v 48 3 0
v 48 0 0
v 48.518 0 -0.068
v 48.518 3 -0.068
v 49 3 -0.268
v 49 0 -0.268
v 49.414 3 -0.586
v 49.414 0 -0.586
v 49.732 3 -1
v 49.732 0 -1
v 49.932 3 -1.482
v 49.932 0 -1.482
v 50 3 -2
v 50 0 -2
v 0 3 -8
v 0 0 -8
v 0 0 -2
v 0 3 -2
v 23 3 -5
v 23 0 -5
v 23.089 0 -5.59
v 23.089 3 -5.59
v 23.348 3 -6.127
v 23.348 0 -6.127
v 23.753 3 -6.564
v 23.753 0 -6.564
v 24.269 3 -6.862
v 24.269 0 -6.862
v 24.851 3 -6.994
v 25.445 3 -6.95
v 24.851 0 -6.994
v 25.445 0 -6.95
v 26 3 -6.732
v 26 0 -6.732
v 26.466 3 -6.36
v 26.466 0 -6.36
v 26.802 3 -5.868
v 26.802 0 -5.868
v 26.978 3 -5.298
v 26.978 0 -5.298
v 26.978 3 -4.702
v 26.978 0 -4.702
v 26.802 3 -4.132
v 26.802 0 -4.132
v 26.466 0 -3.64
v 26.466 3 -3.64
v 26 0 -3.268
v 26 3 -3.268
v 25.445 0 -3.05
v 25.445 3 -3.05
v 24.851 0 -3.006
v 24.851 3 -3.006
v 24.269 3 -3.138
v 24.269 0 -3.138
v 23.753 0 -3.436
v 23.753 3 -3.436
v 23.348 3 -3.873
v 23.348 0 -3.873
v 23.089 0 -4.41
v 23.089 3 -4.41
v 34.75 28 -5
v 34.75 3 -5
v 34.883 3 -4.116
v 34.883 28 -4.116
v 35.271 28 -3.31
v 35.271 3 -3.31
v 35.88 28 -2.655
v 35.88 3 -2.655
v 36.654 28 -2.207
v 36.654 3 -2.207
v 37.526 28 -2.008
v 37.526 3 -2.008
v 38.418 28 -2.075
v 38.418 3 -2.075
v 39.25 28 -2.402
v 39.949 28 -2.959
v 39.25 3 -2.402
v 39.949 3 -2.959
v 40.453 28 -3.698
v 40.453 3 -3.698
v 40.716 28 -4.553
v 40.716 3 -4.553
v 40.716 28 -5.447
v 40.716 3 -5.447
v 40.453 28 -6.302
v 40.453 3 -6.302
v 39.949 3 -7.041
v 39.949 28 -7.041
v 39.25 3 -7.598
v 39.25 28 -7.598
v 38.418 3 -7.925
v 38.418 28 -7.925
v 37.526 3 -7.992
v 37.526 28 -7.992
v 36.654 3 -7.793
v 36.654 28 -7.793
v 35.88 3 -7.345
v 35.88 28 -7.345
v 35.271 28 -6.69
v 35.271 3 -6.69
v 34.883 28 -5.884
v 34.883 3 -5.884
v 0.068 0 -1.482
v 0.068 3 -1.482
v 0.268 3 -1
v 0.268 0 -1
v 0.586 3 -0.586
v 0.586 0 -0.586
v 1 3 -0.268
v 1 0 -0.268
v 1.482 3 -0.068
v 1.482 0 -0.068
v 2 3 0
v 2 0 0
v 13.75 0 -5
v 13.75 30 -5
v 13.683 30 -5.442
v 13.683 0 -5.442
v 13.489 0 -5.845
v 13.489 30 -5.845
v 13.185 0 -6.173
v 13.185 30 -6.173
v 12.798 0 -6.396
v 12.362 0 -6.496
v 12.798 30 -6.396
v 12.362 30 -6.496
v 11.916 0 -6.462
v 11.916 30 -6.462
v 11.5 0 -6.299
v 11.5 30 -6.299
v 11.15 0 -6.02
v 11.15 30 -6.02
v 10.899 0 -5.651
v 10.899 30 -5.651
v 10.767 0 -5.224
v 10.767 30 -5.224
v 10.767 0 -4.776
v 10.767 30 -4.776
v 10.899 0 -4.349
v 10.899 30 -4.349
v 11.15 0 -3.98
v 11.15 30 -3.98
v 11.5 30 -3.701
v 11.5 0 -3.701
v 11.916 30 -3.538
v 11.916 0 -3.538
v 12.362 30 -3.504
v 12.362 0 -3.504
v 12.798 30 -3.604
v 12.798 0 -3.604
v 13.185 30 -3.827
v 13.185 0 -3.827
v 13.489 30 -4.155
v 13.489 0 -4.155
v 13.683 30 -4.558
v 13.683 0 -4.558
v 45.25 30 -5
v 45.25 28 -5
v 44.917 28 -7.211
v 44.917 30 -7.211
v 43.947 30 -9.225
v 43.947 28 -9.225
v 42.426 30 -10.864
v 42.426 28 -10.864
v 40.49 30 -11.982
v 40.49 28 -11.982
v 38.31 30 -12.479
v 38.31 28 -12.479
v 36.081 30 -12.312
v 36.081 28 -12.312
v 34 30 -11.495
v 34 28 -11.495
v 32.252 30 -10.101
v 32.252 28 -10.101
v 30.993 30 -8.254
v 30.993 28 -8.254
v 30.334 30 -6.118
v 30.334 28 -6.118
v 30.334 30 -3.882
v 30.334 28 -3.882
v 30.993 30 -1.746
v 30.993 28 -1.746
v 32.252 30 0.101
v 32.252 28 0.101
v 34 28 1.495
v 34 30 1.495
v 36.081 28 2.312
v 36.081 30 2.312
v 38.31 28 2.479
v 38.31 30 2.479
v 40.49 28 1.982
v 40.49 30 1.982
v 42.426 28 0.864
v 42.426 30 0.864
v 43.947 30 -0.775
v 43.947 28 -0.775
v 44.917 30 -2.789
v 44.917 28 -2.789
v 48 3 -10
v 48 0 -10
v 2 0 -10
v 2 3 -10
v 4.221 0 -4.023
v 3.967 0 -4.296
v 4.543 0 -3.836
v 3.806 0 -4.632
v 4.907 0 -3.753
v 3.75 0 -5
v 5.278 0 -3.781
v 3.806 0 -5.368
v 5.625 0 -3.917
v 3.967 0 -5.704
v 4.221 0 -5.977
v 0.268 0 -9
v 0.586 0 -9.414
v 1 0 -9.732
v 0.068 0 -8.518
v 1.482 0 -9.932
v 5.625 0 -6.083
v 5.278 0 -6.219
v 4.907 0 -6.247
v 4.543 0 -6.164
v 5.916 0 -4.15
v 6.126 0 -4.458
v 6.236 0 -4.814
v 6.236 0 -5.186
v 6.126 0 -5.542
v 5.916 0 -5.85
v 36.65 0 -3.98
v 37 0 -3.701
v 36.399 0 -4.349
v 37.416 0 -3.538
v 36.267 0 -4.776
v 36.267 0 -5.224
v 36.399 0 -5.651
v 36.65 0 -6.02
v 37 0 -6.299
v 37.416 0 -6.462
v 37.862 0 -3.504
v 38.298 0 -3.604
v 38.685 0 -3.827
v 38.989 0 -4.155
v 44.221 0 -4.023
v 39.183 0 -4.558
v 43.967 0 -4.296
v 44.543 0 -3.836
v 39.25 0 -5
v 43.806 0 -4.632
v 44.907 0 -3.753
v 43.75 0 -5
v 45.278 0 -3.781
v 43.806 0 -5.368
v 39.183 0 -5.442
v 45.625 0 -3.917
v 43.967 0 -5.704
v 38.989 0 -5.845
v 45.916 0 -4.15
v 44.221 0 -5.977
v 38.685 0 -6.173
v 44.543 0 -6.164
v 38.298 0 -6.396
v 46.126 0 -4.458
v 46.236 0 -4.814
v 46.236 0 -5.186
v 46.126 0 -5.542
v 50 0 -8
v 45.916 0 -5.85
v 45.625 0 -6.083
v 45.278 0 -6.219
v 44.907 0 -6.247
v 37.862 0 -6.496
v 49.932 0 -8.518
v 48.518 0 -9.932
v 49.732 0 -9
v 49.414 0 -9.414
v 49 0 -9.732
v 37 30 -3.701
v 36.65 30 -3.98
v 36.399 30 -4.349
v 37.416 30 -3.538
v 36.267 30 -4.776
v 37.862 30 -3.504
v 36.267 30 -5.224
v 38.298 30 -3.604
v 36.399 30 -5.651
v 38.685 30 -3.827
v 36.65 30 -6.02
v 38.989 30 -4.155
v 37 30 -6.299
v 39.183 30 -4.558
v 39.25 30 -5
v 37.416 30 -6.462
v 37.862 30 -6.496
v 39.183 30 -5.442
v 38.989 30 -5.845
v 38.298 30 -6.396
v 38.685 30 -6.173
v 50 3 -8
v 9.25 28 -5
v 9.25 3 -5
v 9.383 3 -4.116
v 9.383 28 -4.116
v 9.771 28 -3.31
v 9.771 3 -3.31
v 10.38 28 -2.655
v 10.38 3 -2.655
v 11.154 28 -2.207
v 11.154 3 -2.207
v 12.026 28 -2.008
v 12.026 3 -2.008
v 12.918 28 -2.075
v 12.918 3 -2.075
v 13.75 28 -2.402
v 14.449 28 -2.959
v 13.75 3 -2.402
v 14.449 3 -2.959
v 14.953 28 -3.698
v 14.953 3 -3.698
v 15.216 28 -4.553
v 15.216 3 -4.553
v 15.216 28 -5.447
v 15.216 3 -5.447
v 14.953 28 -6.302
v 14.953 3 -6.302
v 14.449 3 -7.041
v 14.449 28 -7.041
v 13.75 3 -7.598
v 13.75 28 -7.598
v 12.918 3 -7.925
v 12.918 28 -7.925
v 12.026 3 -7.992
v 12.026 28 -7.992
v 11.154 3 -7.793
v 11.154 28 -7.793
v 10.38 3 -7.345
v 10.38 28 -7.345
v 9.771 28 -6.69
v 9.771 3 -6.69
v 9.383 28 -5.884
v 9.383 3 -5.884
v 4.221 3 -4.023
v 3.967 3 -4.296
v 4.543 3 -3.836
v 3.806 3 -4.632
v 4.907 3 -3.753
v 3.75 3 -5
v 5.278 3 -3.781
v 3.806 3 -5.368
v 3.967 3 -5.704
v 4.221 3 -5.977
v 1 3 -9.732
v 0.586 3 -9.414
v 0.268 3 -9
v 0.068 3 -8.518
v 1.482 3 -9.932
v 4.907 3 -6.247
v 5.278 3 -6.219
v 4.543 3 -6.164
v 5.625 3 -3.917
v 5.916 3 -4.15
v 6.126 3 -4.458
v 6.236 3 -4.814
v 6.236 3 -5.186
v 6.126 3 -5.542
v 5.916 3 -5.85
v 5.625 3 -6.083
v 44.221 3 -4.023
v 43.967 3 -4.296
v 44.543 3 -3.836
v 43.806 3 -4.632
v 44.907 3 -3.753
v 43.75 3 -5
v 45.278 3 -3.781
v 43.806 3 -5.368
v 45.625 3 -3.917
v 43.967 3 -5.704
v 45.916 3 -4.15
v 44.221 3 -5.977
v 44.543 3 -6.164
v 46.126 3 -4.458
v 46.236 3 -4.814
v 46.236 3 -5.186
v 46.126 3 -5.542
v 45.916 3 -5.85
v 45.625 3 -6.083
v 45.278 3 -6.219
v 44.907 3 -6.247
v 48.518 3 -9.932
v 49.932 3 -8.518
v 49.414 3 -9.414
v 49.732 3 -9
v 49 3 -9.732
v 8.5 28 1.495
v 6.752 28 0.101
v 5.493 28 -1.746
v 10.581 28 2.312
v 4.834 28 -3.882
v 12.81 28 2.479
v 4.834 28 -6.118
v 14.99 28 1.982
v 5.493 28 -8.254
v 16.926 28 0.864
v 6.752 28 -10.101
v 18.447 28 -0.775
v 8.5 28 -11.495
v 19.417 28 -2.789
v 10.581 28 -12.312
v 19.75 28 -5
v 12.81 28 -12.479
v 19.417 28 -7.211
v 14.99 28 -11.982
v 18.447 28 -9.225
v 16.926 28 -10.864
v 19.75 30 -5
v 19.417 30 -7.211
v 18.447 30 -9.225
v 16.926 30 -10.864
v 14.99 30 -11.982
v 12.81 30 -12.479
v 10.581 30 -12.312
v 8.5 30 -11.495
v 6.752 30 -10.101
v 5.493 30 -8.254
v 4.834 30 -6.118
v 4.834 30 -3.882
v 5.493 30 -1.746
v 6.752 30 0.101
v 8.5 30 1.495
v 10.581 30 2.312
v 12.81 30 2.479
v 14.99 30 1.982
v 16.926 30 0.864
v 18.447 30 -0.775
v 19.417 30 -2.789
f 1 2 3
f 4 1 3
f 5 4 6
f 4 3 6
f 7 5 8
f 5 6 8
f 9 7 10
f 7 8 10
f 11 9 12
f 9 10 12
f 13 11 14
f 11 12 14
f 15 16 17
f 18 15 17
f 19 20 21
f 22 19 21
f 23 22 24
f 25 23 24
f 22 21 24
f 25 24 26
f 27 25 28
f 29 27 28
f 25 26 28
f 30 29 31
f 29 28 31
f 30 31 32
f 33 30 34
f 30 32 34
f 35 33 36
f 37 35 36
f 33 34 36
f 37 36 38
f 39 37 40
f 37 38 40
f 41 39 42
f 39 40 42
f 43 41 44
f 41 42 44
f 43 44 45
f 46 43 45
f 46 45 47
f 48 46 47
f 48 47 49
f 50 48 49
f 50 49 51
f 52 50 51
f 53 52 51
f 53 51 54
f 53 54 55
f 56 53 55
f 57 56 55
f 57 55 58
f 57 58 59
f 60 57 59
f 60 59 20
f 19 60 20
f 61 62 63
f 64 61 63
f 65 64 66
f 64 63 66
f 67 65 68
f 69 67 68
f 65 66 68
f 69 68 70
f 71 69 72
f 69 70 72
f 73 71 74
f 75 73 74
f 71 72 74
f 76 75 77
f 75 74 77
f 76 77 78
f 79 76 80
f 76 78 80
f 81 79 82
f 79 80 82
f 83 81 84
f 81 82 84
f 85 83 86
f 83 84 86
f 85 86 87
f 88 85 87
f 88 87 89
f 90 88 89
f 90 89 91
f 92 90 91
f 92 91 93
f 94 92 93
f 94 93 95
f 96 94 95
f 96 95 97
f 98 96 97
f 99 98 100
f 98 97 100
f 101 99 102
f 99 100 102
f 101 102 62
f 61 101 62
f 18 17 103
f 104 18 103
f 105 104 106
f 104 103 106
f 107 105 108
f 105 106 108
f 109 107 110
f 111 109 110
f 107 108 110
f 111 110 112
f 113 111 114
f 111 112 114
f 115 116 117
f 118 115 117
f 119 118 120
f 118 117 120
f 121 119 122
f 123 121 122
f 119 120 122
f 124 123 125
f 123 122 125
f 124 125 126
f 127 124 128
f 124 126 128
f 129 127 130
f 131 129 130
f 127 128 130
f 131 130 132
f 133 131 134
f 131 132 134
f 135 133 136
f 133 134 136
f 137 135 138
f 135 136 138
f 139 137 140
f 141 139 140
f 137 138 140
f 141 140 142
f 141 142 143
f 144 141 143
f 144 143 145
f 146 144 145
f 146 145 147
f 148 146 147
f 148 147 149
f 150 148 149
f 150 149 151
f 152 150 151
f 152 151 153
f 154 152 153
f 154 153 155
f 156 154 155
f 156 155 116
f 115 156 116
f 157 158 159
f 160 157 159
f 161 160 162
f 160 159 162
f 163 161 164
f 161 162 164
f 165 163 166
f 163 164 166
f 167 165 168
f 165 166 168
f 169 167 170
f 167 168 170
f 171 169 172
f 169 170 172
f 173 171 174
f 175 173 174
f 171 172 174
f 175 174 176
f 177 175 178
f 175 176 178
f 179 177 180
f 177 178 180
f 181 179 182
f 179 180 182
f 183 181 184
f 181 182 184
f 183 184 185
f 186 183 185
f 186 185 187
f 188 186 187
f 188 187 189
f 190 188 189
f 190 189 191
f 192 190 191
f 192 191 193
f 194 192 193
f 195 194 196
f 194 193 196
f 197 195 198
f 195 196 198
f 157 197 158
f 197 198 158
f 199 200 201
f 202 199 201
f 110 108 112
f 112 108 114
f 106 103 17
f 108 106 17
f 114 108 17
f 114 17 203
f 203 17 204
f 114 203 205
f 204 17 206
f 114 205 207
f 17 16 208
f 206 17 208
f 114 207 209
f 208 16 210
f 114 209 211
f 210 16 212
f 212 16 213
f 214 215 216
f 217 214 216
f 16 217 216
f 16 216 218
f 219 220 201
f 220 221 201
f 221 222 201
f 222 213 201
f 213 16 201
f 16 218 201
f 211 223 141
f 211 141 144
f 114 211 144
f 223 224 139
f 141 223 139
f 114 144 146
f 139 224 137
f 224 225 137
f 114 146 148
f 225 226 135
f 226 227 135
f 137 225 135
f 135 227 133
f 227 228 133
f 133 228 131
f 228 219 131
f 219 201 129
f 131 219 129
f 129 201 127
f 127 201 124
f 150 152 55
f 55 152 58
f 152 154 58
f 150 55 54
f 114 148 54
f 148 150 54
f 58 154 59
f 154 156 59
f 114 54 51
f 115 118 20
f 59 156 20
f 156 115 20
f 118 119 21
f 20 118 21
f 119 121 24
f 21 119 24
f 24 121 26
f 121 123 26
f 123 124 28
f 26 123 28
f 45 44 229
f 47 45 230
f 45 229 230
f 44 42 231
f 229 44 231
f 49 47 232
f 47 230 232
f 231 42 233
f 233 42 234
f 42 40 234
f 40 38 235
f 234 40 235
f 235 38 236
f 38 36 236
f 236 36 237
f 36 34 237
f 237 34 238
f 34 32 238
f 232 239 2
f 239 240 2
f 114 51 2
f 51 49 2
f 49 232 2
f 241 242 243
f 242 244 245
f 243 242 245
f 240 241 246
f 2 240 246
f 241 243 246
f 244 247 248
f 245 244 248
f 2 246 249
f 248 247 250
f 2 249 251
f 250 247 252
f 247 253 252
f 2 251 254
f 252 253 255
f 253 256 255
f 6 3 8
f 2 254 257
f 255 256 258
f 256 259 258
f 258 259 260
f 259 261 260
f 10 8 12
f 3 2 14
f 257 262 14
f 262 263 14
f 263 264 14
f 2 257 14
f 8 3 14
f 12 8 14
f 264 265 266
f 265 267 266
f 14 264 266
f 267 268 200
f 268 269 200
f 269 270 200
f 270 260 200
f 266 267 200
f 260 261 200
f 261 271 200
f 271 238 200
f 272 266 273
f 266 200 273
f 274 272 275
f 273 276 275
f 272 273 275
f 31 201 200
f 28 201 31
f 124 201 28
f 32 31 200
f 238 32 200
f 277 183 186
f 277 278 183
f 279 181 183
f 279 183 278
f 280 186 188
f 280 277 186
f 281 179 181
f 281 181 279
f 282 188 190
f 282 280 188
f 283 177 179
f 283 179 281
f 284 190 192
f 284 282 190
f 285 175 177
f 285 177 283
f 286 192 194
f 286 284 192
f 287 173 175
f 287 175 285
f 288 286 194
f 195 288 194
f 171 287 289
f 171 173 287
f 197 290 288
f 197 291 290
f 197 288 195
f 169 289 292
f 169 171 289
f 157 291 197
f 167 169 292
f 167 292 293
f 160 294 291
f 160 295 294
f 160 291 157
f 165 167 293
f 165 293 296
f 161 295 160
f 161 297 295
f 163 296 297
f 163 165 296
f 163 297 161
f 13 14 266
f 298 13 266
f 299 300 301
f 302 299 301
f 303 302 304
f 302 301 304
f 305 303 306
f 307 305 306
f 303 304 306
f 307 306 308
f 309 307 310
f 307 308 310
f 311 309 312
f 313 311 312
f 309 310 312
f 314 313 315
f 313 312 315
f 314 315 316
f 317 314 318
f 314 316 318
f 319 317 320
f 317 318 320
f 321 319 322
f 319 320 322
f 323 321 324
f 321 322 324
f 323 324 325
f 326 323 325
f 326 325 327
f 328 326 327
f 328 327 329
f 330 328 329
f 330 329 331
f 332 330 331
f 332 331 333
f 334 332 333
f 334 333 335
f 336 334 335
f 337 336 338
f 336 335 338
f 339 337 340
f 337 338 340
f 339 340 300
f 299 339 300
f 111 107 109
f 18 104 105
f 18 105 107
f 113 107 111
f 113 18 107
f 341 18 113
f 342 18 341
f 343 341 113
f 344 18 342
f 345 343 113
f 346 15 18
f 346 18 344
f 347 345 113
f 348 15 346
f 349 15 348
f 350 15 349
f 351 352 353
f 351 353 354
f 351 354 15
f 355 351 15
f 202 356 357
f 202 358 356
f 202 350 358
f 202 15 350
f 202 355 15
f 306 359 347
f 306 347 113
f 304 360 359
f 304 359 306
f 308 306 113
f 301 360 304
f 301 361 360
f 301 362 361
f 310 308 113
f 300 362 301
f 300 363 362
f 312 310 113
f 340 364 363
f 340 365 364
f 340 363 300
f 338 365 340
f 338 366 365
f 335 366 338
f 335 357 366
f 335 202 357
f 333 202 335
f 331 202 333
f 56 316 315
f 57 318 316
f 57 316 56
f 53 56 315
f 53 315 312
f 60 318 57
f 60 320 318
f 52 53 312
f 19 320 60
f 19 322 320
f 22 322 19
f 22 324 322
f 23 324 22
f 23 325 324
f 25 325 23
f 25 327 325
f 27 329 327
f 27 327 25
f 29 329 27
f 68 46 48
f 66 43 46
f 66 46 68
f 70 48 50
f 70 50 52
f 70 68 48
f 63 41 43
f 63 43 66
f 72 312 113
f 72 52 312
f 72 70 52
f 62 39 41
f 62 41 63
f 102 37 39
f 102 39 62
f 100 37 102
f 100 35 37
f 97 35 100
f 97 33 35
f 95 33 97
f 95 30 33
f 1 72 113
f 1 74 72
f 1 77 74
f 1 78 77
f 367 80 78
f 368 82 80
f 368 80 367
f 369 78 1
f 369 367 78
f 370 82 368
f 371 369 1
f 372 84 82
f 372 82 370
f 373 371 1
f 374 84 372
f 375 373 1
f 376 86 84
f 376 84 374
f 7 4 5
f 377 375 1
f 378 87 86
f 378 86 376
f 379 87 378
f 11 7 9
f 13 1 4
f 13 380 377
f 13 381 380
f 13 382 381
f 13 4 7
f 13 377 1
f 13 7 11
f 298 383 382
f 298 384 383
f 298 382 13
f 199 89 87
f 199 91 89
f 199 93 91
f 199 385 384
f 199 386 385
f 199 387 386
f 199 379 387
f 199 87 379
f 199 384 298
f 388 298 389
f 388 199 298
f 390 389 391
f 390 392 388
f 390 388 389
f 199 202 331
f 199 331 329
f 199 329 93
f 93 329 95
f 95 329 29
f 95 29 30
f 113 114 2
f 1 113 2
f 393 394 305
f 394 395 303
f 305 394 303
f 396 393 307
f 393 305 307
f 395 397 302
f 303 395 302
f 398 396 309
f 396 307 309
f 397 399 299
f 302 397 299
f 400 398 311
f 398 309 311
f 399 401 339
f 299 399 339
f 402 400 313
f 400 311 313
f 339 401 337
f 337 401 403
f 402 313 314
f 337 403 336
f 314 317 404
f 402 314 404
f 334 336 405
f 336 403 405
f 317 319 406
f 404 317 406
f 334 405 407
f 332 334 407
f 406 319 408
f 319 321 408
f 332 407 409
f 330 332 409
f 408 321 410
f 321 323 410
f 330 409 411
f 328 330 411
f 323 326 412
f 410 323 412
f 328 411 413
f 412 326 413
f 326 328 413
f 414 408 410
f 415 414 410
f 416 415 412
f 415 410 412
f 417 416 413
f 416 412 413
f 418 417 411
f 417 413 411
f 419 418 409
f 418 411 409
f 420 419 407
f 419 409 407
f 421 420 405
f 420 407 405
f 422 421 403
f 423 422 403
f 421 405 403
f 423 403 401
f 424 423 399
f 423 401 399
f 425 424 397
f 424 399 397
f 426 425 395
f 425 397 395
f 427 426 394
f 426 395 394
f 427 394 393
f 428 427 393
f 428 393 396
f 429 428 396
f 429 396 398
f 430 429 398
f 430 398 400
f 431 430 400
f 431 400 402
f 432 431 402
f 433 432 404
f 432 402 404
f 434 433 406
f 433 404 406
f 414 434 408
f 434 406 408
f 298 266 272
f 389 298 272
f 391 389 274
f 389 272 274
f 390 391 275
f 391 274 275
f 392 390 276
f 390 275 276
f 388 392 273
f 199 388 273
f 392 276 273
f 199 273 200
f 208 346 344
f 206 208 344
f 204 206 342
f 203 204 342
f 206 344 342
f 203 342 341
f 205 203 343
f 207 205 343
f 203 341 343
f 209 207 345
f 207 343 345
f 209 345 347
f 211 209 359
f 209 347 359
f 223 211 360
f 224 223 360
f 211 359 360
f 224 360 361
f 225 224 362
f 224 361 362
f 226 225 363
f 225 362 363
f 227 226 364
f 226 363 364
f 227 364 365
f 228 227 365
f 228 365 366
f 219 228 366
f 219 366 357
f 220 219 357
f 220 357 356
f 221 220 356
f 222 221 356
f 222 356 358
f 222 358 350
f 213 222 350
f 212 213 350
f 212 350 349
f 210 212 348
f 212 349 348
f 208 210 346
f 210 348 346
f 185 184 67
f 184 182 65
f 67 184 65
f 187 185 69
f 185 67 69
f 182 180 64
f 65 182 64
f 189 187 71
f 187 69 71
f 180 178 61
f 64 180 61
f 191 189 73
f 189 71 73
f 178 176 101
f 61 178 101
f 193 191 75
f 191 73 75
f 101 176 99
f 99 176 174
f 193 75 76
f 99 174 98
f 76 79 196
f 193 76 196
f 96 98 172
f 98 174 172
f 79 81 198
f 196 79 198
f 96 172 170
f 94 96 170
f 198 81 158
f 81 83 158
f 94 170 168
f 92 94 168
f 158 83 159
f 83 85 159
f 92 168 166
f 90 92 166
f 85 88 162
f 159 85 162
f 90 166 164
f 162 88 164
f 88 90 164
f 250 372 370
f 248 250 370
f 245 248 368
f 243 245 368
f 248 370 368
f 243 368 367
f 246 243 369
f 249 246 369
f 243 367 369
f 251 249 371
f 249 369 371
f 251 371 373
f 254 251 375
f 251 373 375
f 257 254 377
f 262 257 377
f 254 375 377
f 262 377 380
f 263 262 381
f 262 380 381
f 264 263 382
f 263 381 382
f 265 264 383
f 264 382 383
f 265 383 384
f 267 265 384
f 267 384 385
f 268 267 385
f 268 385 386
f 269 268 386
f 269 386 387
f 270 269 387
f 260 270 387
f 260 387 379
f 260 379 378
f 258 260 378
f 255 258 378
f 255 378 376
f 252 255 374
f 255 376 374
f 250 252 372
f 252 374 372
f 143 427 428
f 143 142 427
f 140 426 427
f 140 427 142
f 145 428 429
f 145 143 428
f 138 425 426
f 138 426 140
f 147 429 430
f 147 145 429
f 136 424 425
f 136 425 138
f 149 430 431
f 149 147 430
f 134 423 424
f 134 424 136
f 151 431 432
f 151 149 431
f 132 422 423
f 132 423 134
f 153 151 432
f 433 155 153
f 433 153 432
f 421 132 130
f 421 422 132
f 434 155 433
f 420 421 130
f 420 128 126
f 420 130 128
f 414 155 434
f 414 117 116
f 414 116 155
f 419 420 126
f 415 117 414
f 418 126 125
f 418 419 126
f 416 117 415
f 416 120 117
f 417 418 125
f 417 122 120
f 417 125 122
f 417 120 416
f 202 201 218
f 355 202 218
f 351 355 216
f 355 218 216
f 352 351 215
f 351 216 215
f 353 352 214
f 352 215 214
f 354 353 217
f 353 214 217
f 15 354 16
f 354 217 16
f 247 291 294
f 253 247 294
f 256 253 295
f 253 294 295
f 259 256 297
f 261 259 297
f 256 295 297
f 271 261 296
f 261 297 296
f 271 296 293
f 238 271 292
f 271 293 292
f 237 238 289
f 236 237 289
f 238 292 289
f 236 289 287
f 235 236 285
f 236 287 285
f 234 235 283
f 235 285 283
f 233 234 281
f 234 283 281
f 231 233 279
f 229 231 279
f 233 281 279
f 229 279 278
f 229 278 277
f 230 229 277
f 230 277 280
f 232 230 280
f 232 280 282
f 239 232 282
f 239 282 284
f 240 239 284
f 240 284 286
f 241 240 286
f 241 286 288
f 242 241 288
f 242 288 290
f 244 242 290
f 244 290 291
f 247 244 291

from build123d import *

# Parameters (mm, degrees)
BOSS_EXTRUDE8_DEPTH  = 3
CUT_EXTRUDE8_DEPTH   = 3
BOSS_EXTRUDE9_DEPTH  = 25
SKETCH17_R           = 7.5
BOSS_EXTRUDE10_DEPTH = 2
SKETCH18_R           = 1.5
CUT_EXTRUDE9_DEPTH   = 62
SKETCH19_R           = 7.5
BOSS_EXTRUDE11_DEPTH = 2
SKETCH21_R           = 1.5
CUT_EXTRUDE10_DEPTH  = 52
CUT_EXTRUDE11_DEPTH  = 22


with BuildPart() as part:
    # Sketch1 → Boss-Extrude8 (new body)
    with BuildSketch(Plane(origin=(0, 0, 0), x_dir=(1, 0, 0), z_dir=(0, 1, 0))):
        with BuildLine():
            Line((2, 0), (48, 0))
            ThreePointArc((48, 0), (49.414213562, 0.585786438), (50, 2))
            Line((50, 2), (50, 8))
            ThreePointArc((50, 8), (49.414213562, 9.414213562), (48, 10))
            Line((48, 10), (2, 10))
            ThreePointArc((2, 10), (0.585786438, 9.414213562), (0, 8))
            Line((0, 8), (0, 2))
            ThreePointArc((0, 2), (0.585786438, 0.585786438), (2, 0))
        make_face()
    extrude(amount=BOSS_EXTRUDE8_DEPTH)

    # Sketch15 → Cut-Extrude8 (cut)
    with BuildSketch(Plane(origin=(0, 3, 0), x_dir=(1, 0, 0), z_dir=(0, 1, 0))):
        with BuildLine():
            Line((3.75, 5), (5, 5))
            Line((5, 5), (6.25, 5))
            ThreePointArc((6.25, 5), (5, 6.25), (3.75, 5))
        make_face()
        with BuildLine():
            Line((6.25, 5), (5, 5))
            Line((5, 5), (3.75, 5))
            ThreePointArc((3.75, 5), (5, 3.75), (6.25, 5))
        make_face()
        with BuildLine():
            ThreePointArc((46.25, 5), (45, 6.25), (43.75, 5))
            Line((43.75, 5), (45, 5))
            Line((45, 5), (46.25, 5))
        make_face()
        with BuildLine():
            Line((45, 5), (43.75, 5))
            ThreePointArc((43.75, 5), (45, 3.75), (46.25, 5))
            Line((46.25, 5), (45, 5))
        make_face()
    extrude(amount=-CUT_EXTRUDE8_DEPTH, mode=Mode.SUBTRACT)

    # Sketch16 → Boss-Extrude9 (add)
    with BuildSketch(Plane(origin=(0, 3, 0), x_dir=(1, 0, 0), z_dir=(0, 1, 0))):
        with BuildLine():
            Line((9.25, 5), (12.25, 5))
            Line((12.25, 5), (15.25, 5))
            ThreePointArc((15.25, 5), (12.25, 8), (9.25, 5))
        make_face()
        with BuildLine():
            Line((15.25, 5), (12.25, 5))
            Line((12.25, 5), (9.25, 5))
            ThreePointArc((9.25, 5), (12.25, 2), (15.25, 5))
        make_face()
        with BuildLine():
            ThreePointArc((40.75, 5), (37.75, 8), (34.75, 5))
            Line((34.75, 5), (37.75, 5))
            Line((37.75, 5), (40.75, 5))
        make_face()
        with BuildLine():
            Line((37.75, 5), (34.75, 5))
            ThreePointArc((34.75, 5), (37.75, 2), (40.75, 5))
            Line((40.75, 5), (37.75, 5))
        make_face()
    extrude(amount=BOSS_EXTRUDE9_DEPTH)

    # Sketch17 → Boss-Extrude10 (add)
    with BuildSketch(Plane(origin=(0, 28, 0), x_dir=(1, 0, 0), z_dir=(0, 1, 0))):
        with Locations((12.25, 5)):
            Circle(SKETCH17_R)
    extrude(amount=BOSS_EXTRUDE10_DEPTH)

    # Sketch18 → Cut-Extrude9 (cut)
    with BuildSketch(Plane(origin=(0, 30, 0), x_dir=(1, 0, 0), z_dir=(0, 1, 0))):
        with Locations((12.25, 5)):
            Circle(SKETCH18_R)
    extrude(amount=-CUT_EXTRUDE9_DEPTH, mode=Mode.SUBTRACT)

    # Sketch19 → Boss-Extrude11 (add)
    with BuildSketch(Plane(origin=(0, 28, 0), x_dir=(1, 0, 0), z_dir=(0, 1, 0))):
        with Locations((37.75, 5)):
            Circle(SKETCH19_R)
    extrude(amount=BOSS_EXTRUDE11_DEPTH)

    # Sketch21 → Cut-Extrude10 (cut)
    with BuildSketch(Plane(origin=(0, 30, 0), x_dir=(1, 0, 0), z_dir=(0, 1, 0))):
        with Locations((37.75, 5)):
            Circle(SKETCH21_R)
    extrude(amount=-CUT_EXTRUDE10_DEPTH, mode=Mode.SUBTRACT)

    # Sketch23 → Cut-Extrude11 (cut)
    with BuildSketch(Plane.XZ):
        with BuildLine():
            ThreePointArc((27, -5), (25, -3), (23, -5))
            Line((23, -5), (27, -5))
        make_face()
        with BuildLine():
            Line((27, -5), (23, -5))
            ThreePointArc((23, -5), (25, -7), (27, -5))
        make_face()
    extrude(amount=-CUT_EXTRUDE11_DEPTH, mode=Mode.SUBTRACT)


solid = part.part
